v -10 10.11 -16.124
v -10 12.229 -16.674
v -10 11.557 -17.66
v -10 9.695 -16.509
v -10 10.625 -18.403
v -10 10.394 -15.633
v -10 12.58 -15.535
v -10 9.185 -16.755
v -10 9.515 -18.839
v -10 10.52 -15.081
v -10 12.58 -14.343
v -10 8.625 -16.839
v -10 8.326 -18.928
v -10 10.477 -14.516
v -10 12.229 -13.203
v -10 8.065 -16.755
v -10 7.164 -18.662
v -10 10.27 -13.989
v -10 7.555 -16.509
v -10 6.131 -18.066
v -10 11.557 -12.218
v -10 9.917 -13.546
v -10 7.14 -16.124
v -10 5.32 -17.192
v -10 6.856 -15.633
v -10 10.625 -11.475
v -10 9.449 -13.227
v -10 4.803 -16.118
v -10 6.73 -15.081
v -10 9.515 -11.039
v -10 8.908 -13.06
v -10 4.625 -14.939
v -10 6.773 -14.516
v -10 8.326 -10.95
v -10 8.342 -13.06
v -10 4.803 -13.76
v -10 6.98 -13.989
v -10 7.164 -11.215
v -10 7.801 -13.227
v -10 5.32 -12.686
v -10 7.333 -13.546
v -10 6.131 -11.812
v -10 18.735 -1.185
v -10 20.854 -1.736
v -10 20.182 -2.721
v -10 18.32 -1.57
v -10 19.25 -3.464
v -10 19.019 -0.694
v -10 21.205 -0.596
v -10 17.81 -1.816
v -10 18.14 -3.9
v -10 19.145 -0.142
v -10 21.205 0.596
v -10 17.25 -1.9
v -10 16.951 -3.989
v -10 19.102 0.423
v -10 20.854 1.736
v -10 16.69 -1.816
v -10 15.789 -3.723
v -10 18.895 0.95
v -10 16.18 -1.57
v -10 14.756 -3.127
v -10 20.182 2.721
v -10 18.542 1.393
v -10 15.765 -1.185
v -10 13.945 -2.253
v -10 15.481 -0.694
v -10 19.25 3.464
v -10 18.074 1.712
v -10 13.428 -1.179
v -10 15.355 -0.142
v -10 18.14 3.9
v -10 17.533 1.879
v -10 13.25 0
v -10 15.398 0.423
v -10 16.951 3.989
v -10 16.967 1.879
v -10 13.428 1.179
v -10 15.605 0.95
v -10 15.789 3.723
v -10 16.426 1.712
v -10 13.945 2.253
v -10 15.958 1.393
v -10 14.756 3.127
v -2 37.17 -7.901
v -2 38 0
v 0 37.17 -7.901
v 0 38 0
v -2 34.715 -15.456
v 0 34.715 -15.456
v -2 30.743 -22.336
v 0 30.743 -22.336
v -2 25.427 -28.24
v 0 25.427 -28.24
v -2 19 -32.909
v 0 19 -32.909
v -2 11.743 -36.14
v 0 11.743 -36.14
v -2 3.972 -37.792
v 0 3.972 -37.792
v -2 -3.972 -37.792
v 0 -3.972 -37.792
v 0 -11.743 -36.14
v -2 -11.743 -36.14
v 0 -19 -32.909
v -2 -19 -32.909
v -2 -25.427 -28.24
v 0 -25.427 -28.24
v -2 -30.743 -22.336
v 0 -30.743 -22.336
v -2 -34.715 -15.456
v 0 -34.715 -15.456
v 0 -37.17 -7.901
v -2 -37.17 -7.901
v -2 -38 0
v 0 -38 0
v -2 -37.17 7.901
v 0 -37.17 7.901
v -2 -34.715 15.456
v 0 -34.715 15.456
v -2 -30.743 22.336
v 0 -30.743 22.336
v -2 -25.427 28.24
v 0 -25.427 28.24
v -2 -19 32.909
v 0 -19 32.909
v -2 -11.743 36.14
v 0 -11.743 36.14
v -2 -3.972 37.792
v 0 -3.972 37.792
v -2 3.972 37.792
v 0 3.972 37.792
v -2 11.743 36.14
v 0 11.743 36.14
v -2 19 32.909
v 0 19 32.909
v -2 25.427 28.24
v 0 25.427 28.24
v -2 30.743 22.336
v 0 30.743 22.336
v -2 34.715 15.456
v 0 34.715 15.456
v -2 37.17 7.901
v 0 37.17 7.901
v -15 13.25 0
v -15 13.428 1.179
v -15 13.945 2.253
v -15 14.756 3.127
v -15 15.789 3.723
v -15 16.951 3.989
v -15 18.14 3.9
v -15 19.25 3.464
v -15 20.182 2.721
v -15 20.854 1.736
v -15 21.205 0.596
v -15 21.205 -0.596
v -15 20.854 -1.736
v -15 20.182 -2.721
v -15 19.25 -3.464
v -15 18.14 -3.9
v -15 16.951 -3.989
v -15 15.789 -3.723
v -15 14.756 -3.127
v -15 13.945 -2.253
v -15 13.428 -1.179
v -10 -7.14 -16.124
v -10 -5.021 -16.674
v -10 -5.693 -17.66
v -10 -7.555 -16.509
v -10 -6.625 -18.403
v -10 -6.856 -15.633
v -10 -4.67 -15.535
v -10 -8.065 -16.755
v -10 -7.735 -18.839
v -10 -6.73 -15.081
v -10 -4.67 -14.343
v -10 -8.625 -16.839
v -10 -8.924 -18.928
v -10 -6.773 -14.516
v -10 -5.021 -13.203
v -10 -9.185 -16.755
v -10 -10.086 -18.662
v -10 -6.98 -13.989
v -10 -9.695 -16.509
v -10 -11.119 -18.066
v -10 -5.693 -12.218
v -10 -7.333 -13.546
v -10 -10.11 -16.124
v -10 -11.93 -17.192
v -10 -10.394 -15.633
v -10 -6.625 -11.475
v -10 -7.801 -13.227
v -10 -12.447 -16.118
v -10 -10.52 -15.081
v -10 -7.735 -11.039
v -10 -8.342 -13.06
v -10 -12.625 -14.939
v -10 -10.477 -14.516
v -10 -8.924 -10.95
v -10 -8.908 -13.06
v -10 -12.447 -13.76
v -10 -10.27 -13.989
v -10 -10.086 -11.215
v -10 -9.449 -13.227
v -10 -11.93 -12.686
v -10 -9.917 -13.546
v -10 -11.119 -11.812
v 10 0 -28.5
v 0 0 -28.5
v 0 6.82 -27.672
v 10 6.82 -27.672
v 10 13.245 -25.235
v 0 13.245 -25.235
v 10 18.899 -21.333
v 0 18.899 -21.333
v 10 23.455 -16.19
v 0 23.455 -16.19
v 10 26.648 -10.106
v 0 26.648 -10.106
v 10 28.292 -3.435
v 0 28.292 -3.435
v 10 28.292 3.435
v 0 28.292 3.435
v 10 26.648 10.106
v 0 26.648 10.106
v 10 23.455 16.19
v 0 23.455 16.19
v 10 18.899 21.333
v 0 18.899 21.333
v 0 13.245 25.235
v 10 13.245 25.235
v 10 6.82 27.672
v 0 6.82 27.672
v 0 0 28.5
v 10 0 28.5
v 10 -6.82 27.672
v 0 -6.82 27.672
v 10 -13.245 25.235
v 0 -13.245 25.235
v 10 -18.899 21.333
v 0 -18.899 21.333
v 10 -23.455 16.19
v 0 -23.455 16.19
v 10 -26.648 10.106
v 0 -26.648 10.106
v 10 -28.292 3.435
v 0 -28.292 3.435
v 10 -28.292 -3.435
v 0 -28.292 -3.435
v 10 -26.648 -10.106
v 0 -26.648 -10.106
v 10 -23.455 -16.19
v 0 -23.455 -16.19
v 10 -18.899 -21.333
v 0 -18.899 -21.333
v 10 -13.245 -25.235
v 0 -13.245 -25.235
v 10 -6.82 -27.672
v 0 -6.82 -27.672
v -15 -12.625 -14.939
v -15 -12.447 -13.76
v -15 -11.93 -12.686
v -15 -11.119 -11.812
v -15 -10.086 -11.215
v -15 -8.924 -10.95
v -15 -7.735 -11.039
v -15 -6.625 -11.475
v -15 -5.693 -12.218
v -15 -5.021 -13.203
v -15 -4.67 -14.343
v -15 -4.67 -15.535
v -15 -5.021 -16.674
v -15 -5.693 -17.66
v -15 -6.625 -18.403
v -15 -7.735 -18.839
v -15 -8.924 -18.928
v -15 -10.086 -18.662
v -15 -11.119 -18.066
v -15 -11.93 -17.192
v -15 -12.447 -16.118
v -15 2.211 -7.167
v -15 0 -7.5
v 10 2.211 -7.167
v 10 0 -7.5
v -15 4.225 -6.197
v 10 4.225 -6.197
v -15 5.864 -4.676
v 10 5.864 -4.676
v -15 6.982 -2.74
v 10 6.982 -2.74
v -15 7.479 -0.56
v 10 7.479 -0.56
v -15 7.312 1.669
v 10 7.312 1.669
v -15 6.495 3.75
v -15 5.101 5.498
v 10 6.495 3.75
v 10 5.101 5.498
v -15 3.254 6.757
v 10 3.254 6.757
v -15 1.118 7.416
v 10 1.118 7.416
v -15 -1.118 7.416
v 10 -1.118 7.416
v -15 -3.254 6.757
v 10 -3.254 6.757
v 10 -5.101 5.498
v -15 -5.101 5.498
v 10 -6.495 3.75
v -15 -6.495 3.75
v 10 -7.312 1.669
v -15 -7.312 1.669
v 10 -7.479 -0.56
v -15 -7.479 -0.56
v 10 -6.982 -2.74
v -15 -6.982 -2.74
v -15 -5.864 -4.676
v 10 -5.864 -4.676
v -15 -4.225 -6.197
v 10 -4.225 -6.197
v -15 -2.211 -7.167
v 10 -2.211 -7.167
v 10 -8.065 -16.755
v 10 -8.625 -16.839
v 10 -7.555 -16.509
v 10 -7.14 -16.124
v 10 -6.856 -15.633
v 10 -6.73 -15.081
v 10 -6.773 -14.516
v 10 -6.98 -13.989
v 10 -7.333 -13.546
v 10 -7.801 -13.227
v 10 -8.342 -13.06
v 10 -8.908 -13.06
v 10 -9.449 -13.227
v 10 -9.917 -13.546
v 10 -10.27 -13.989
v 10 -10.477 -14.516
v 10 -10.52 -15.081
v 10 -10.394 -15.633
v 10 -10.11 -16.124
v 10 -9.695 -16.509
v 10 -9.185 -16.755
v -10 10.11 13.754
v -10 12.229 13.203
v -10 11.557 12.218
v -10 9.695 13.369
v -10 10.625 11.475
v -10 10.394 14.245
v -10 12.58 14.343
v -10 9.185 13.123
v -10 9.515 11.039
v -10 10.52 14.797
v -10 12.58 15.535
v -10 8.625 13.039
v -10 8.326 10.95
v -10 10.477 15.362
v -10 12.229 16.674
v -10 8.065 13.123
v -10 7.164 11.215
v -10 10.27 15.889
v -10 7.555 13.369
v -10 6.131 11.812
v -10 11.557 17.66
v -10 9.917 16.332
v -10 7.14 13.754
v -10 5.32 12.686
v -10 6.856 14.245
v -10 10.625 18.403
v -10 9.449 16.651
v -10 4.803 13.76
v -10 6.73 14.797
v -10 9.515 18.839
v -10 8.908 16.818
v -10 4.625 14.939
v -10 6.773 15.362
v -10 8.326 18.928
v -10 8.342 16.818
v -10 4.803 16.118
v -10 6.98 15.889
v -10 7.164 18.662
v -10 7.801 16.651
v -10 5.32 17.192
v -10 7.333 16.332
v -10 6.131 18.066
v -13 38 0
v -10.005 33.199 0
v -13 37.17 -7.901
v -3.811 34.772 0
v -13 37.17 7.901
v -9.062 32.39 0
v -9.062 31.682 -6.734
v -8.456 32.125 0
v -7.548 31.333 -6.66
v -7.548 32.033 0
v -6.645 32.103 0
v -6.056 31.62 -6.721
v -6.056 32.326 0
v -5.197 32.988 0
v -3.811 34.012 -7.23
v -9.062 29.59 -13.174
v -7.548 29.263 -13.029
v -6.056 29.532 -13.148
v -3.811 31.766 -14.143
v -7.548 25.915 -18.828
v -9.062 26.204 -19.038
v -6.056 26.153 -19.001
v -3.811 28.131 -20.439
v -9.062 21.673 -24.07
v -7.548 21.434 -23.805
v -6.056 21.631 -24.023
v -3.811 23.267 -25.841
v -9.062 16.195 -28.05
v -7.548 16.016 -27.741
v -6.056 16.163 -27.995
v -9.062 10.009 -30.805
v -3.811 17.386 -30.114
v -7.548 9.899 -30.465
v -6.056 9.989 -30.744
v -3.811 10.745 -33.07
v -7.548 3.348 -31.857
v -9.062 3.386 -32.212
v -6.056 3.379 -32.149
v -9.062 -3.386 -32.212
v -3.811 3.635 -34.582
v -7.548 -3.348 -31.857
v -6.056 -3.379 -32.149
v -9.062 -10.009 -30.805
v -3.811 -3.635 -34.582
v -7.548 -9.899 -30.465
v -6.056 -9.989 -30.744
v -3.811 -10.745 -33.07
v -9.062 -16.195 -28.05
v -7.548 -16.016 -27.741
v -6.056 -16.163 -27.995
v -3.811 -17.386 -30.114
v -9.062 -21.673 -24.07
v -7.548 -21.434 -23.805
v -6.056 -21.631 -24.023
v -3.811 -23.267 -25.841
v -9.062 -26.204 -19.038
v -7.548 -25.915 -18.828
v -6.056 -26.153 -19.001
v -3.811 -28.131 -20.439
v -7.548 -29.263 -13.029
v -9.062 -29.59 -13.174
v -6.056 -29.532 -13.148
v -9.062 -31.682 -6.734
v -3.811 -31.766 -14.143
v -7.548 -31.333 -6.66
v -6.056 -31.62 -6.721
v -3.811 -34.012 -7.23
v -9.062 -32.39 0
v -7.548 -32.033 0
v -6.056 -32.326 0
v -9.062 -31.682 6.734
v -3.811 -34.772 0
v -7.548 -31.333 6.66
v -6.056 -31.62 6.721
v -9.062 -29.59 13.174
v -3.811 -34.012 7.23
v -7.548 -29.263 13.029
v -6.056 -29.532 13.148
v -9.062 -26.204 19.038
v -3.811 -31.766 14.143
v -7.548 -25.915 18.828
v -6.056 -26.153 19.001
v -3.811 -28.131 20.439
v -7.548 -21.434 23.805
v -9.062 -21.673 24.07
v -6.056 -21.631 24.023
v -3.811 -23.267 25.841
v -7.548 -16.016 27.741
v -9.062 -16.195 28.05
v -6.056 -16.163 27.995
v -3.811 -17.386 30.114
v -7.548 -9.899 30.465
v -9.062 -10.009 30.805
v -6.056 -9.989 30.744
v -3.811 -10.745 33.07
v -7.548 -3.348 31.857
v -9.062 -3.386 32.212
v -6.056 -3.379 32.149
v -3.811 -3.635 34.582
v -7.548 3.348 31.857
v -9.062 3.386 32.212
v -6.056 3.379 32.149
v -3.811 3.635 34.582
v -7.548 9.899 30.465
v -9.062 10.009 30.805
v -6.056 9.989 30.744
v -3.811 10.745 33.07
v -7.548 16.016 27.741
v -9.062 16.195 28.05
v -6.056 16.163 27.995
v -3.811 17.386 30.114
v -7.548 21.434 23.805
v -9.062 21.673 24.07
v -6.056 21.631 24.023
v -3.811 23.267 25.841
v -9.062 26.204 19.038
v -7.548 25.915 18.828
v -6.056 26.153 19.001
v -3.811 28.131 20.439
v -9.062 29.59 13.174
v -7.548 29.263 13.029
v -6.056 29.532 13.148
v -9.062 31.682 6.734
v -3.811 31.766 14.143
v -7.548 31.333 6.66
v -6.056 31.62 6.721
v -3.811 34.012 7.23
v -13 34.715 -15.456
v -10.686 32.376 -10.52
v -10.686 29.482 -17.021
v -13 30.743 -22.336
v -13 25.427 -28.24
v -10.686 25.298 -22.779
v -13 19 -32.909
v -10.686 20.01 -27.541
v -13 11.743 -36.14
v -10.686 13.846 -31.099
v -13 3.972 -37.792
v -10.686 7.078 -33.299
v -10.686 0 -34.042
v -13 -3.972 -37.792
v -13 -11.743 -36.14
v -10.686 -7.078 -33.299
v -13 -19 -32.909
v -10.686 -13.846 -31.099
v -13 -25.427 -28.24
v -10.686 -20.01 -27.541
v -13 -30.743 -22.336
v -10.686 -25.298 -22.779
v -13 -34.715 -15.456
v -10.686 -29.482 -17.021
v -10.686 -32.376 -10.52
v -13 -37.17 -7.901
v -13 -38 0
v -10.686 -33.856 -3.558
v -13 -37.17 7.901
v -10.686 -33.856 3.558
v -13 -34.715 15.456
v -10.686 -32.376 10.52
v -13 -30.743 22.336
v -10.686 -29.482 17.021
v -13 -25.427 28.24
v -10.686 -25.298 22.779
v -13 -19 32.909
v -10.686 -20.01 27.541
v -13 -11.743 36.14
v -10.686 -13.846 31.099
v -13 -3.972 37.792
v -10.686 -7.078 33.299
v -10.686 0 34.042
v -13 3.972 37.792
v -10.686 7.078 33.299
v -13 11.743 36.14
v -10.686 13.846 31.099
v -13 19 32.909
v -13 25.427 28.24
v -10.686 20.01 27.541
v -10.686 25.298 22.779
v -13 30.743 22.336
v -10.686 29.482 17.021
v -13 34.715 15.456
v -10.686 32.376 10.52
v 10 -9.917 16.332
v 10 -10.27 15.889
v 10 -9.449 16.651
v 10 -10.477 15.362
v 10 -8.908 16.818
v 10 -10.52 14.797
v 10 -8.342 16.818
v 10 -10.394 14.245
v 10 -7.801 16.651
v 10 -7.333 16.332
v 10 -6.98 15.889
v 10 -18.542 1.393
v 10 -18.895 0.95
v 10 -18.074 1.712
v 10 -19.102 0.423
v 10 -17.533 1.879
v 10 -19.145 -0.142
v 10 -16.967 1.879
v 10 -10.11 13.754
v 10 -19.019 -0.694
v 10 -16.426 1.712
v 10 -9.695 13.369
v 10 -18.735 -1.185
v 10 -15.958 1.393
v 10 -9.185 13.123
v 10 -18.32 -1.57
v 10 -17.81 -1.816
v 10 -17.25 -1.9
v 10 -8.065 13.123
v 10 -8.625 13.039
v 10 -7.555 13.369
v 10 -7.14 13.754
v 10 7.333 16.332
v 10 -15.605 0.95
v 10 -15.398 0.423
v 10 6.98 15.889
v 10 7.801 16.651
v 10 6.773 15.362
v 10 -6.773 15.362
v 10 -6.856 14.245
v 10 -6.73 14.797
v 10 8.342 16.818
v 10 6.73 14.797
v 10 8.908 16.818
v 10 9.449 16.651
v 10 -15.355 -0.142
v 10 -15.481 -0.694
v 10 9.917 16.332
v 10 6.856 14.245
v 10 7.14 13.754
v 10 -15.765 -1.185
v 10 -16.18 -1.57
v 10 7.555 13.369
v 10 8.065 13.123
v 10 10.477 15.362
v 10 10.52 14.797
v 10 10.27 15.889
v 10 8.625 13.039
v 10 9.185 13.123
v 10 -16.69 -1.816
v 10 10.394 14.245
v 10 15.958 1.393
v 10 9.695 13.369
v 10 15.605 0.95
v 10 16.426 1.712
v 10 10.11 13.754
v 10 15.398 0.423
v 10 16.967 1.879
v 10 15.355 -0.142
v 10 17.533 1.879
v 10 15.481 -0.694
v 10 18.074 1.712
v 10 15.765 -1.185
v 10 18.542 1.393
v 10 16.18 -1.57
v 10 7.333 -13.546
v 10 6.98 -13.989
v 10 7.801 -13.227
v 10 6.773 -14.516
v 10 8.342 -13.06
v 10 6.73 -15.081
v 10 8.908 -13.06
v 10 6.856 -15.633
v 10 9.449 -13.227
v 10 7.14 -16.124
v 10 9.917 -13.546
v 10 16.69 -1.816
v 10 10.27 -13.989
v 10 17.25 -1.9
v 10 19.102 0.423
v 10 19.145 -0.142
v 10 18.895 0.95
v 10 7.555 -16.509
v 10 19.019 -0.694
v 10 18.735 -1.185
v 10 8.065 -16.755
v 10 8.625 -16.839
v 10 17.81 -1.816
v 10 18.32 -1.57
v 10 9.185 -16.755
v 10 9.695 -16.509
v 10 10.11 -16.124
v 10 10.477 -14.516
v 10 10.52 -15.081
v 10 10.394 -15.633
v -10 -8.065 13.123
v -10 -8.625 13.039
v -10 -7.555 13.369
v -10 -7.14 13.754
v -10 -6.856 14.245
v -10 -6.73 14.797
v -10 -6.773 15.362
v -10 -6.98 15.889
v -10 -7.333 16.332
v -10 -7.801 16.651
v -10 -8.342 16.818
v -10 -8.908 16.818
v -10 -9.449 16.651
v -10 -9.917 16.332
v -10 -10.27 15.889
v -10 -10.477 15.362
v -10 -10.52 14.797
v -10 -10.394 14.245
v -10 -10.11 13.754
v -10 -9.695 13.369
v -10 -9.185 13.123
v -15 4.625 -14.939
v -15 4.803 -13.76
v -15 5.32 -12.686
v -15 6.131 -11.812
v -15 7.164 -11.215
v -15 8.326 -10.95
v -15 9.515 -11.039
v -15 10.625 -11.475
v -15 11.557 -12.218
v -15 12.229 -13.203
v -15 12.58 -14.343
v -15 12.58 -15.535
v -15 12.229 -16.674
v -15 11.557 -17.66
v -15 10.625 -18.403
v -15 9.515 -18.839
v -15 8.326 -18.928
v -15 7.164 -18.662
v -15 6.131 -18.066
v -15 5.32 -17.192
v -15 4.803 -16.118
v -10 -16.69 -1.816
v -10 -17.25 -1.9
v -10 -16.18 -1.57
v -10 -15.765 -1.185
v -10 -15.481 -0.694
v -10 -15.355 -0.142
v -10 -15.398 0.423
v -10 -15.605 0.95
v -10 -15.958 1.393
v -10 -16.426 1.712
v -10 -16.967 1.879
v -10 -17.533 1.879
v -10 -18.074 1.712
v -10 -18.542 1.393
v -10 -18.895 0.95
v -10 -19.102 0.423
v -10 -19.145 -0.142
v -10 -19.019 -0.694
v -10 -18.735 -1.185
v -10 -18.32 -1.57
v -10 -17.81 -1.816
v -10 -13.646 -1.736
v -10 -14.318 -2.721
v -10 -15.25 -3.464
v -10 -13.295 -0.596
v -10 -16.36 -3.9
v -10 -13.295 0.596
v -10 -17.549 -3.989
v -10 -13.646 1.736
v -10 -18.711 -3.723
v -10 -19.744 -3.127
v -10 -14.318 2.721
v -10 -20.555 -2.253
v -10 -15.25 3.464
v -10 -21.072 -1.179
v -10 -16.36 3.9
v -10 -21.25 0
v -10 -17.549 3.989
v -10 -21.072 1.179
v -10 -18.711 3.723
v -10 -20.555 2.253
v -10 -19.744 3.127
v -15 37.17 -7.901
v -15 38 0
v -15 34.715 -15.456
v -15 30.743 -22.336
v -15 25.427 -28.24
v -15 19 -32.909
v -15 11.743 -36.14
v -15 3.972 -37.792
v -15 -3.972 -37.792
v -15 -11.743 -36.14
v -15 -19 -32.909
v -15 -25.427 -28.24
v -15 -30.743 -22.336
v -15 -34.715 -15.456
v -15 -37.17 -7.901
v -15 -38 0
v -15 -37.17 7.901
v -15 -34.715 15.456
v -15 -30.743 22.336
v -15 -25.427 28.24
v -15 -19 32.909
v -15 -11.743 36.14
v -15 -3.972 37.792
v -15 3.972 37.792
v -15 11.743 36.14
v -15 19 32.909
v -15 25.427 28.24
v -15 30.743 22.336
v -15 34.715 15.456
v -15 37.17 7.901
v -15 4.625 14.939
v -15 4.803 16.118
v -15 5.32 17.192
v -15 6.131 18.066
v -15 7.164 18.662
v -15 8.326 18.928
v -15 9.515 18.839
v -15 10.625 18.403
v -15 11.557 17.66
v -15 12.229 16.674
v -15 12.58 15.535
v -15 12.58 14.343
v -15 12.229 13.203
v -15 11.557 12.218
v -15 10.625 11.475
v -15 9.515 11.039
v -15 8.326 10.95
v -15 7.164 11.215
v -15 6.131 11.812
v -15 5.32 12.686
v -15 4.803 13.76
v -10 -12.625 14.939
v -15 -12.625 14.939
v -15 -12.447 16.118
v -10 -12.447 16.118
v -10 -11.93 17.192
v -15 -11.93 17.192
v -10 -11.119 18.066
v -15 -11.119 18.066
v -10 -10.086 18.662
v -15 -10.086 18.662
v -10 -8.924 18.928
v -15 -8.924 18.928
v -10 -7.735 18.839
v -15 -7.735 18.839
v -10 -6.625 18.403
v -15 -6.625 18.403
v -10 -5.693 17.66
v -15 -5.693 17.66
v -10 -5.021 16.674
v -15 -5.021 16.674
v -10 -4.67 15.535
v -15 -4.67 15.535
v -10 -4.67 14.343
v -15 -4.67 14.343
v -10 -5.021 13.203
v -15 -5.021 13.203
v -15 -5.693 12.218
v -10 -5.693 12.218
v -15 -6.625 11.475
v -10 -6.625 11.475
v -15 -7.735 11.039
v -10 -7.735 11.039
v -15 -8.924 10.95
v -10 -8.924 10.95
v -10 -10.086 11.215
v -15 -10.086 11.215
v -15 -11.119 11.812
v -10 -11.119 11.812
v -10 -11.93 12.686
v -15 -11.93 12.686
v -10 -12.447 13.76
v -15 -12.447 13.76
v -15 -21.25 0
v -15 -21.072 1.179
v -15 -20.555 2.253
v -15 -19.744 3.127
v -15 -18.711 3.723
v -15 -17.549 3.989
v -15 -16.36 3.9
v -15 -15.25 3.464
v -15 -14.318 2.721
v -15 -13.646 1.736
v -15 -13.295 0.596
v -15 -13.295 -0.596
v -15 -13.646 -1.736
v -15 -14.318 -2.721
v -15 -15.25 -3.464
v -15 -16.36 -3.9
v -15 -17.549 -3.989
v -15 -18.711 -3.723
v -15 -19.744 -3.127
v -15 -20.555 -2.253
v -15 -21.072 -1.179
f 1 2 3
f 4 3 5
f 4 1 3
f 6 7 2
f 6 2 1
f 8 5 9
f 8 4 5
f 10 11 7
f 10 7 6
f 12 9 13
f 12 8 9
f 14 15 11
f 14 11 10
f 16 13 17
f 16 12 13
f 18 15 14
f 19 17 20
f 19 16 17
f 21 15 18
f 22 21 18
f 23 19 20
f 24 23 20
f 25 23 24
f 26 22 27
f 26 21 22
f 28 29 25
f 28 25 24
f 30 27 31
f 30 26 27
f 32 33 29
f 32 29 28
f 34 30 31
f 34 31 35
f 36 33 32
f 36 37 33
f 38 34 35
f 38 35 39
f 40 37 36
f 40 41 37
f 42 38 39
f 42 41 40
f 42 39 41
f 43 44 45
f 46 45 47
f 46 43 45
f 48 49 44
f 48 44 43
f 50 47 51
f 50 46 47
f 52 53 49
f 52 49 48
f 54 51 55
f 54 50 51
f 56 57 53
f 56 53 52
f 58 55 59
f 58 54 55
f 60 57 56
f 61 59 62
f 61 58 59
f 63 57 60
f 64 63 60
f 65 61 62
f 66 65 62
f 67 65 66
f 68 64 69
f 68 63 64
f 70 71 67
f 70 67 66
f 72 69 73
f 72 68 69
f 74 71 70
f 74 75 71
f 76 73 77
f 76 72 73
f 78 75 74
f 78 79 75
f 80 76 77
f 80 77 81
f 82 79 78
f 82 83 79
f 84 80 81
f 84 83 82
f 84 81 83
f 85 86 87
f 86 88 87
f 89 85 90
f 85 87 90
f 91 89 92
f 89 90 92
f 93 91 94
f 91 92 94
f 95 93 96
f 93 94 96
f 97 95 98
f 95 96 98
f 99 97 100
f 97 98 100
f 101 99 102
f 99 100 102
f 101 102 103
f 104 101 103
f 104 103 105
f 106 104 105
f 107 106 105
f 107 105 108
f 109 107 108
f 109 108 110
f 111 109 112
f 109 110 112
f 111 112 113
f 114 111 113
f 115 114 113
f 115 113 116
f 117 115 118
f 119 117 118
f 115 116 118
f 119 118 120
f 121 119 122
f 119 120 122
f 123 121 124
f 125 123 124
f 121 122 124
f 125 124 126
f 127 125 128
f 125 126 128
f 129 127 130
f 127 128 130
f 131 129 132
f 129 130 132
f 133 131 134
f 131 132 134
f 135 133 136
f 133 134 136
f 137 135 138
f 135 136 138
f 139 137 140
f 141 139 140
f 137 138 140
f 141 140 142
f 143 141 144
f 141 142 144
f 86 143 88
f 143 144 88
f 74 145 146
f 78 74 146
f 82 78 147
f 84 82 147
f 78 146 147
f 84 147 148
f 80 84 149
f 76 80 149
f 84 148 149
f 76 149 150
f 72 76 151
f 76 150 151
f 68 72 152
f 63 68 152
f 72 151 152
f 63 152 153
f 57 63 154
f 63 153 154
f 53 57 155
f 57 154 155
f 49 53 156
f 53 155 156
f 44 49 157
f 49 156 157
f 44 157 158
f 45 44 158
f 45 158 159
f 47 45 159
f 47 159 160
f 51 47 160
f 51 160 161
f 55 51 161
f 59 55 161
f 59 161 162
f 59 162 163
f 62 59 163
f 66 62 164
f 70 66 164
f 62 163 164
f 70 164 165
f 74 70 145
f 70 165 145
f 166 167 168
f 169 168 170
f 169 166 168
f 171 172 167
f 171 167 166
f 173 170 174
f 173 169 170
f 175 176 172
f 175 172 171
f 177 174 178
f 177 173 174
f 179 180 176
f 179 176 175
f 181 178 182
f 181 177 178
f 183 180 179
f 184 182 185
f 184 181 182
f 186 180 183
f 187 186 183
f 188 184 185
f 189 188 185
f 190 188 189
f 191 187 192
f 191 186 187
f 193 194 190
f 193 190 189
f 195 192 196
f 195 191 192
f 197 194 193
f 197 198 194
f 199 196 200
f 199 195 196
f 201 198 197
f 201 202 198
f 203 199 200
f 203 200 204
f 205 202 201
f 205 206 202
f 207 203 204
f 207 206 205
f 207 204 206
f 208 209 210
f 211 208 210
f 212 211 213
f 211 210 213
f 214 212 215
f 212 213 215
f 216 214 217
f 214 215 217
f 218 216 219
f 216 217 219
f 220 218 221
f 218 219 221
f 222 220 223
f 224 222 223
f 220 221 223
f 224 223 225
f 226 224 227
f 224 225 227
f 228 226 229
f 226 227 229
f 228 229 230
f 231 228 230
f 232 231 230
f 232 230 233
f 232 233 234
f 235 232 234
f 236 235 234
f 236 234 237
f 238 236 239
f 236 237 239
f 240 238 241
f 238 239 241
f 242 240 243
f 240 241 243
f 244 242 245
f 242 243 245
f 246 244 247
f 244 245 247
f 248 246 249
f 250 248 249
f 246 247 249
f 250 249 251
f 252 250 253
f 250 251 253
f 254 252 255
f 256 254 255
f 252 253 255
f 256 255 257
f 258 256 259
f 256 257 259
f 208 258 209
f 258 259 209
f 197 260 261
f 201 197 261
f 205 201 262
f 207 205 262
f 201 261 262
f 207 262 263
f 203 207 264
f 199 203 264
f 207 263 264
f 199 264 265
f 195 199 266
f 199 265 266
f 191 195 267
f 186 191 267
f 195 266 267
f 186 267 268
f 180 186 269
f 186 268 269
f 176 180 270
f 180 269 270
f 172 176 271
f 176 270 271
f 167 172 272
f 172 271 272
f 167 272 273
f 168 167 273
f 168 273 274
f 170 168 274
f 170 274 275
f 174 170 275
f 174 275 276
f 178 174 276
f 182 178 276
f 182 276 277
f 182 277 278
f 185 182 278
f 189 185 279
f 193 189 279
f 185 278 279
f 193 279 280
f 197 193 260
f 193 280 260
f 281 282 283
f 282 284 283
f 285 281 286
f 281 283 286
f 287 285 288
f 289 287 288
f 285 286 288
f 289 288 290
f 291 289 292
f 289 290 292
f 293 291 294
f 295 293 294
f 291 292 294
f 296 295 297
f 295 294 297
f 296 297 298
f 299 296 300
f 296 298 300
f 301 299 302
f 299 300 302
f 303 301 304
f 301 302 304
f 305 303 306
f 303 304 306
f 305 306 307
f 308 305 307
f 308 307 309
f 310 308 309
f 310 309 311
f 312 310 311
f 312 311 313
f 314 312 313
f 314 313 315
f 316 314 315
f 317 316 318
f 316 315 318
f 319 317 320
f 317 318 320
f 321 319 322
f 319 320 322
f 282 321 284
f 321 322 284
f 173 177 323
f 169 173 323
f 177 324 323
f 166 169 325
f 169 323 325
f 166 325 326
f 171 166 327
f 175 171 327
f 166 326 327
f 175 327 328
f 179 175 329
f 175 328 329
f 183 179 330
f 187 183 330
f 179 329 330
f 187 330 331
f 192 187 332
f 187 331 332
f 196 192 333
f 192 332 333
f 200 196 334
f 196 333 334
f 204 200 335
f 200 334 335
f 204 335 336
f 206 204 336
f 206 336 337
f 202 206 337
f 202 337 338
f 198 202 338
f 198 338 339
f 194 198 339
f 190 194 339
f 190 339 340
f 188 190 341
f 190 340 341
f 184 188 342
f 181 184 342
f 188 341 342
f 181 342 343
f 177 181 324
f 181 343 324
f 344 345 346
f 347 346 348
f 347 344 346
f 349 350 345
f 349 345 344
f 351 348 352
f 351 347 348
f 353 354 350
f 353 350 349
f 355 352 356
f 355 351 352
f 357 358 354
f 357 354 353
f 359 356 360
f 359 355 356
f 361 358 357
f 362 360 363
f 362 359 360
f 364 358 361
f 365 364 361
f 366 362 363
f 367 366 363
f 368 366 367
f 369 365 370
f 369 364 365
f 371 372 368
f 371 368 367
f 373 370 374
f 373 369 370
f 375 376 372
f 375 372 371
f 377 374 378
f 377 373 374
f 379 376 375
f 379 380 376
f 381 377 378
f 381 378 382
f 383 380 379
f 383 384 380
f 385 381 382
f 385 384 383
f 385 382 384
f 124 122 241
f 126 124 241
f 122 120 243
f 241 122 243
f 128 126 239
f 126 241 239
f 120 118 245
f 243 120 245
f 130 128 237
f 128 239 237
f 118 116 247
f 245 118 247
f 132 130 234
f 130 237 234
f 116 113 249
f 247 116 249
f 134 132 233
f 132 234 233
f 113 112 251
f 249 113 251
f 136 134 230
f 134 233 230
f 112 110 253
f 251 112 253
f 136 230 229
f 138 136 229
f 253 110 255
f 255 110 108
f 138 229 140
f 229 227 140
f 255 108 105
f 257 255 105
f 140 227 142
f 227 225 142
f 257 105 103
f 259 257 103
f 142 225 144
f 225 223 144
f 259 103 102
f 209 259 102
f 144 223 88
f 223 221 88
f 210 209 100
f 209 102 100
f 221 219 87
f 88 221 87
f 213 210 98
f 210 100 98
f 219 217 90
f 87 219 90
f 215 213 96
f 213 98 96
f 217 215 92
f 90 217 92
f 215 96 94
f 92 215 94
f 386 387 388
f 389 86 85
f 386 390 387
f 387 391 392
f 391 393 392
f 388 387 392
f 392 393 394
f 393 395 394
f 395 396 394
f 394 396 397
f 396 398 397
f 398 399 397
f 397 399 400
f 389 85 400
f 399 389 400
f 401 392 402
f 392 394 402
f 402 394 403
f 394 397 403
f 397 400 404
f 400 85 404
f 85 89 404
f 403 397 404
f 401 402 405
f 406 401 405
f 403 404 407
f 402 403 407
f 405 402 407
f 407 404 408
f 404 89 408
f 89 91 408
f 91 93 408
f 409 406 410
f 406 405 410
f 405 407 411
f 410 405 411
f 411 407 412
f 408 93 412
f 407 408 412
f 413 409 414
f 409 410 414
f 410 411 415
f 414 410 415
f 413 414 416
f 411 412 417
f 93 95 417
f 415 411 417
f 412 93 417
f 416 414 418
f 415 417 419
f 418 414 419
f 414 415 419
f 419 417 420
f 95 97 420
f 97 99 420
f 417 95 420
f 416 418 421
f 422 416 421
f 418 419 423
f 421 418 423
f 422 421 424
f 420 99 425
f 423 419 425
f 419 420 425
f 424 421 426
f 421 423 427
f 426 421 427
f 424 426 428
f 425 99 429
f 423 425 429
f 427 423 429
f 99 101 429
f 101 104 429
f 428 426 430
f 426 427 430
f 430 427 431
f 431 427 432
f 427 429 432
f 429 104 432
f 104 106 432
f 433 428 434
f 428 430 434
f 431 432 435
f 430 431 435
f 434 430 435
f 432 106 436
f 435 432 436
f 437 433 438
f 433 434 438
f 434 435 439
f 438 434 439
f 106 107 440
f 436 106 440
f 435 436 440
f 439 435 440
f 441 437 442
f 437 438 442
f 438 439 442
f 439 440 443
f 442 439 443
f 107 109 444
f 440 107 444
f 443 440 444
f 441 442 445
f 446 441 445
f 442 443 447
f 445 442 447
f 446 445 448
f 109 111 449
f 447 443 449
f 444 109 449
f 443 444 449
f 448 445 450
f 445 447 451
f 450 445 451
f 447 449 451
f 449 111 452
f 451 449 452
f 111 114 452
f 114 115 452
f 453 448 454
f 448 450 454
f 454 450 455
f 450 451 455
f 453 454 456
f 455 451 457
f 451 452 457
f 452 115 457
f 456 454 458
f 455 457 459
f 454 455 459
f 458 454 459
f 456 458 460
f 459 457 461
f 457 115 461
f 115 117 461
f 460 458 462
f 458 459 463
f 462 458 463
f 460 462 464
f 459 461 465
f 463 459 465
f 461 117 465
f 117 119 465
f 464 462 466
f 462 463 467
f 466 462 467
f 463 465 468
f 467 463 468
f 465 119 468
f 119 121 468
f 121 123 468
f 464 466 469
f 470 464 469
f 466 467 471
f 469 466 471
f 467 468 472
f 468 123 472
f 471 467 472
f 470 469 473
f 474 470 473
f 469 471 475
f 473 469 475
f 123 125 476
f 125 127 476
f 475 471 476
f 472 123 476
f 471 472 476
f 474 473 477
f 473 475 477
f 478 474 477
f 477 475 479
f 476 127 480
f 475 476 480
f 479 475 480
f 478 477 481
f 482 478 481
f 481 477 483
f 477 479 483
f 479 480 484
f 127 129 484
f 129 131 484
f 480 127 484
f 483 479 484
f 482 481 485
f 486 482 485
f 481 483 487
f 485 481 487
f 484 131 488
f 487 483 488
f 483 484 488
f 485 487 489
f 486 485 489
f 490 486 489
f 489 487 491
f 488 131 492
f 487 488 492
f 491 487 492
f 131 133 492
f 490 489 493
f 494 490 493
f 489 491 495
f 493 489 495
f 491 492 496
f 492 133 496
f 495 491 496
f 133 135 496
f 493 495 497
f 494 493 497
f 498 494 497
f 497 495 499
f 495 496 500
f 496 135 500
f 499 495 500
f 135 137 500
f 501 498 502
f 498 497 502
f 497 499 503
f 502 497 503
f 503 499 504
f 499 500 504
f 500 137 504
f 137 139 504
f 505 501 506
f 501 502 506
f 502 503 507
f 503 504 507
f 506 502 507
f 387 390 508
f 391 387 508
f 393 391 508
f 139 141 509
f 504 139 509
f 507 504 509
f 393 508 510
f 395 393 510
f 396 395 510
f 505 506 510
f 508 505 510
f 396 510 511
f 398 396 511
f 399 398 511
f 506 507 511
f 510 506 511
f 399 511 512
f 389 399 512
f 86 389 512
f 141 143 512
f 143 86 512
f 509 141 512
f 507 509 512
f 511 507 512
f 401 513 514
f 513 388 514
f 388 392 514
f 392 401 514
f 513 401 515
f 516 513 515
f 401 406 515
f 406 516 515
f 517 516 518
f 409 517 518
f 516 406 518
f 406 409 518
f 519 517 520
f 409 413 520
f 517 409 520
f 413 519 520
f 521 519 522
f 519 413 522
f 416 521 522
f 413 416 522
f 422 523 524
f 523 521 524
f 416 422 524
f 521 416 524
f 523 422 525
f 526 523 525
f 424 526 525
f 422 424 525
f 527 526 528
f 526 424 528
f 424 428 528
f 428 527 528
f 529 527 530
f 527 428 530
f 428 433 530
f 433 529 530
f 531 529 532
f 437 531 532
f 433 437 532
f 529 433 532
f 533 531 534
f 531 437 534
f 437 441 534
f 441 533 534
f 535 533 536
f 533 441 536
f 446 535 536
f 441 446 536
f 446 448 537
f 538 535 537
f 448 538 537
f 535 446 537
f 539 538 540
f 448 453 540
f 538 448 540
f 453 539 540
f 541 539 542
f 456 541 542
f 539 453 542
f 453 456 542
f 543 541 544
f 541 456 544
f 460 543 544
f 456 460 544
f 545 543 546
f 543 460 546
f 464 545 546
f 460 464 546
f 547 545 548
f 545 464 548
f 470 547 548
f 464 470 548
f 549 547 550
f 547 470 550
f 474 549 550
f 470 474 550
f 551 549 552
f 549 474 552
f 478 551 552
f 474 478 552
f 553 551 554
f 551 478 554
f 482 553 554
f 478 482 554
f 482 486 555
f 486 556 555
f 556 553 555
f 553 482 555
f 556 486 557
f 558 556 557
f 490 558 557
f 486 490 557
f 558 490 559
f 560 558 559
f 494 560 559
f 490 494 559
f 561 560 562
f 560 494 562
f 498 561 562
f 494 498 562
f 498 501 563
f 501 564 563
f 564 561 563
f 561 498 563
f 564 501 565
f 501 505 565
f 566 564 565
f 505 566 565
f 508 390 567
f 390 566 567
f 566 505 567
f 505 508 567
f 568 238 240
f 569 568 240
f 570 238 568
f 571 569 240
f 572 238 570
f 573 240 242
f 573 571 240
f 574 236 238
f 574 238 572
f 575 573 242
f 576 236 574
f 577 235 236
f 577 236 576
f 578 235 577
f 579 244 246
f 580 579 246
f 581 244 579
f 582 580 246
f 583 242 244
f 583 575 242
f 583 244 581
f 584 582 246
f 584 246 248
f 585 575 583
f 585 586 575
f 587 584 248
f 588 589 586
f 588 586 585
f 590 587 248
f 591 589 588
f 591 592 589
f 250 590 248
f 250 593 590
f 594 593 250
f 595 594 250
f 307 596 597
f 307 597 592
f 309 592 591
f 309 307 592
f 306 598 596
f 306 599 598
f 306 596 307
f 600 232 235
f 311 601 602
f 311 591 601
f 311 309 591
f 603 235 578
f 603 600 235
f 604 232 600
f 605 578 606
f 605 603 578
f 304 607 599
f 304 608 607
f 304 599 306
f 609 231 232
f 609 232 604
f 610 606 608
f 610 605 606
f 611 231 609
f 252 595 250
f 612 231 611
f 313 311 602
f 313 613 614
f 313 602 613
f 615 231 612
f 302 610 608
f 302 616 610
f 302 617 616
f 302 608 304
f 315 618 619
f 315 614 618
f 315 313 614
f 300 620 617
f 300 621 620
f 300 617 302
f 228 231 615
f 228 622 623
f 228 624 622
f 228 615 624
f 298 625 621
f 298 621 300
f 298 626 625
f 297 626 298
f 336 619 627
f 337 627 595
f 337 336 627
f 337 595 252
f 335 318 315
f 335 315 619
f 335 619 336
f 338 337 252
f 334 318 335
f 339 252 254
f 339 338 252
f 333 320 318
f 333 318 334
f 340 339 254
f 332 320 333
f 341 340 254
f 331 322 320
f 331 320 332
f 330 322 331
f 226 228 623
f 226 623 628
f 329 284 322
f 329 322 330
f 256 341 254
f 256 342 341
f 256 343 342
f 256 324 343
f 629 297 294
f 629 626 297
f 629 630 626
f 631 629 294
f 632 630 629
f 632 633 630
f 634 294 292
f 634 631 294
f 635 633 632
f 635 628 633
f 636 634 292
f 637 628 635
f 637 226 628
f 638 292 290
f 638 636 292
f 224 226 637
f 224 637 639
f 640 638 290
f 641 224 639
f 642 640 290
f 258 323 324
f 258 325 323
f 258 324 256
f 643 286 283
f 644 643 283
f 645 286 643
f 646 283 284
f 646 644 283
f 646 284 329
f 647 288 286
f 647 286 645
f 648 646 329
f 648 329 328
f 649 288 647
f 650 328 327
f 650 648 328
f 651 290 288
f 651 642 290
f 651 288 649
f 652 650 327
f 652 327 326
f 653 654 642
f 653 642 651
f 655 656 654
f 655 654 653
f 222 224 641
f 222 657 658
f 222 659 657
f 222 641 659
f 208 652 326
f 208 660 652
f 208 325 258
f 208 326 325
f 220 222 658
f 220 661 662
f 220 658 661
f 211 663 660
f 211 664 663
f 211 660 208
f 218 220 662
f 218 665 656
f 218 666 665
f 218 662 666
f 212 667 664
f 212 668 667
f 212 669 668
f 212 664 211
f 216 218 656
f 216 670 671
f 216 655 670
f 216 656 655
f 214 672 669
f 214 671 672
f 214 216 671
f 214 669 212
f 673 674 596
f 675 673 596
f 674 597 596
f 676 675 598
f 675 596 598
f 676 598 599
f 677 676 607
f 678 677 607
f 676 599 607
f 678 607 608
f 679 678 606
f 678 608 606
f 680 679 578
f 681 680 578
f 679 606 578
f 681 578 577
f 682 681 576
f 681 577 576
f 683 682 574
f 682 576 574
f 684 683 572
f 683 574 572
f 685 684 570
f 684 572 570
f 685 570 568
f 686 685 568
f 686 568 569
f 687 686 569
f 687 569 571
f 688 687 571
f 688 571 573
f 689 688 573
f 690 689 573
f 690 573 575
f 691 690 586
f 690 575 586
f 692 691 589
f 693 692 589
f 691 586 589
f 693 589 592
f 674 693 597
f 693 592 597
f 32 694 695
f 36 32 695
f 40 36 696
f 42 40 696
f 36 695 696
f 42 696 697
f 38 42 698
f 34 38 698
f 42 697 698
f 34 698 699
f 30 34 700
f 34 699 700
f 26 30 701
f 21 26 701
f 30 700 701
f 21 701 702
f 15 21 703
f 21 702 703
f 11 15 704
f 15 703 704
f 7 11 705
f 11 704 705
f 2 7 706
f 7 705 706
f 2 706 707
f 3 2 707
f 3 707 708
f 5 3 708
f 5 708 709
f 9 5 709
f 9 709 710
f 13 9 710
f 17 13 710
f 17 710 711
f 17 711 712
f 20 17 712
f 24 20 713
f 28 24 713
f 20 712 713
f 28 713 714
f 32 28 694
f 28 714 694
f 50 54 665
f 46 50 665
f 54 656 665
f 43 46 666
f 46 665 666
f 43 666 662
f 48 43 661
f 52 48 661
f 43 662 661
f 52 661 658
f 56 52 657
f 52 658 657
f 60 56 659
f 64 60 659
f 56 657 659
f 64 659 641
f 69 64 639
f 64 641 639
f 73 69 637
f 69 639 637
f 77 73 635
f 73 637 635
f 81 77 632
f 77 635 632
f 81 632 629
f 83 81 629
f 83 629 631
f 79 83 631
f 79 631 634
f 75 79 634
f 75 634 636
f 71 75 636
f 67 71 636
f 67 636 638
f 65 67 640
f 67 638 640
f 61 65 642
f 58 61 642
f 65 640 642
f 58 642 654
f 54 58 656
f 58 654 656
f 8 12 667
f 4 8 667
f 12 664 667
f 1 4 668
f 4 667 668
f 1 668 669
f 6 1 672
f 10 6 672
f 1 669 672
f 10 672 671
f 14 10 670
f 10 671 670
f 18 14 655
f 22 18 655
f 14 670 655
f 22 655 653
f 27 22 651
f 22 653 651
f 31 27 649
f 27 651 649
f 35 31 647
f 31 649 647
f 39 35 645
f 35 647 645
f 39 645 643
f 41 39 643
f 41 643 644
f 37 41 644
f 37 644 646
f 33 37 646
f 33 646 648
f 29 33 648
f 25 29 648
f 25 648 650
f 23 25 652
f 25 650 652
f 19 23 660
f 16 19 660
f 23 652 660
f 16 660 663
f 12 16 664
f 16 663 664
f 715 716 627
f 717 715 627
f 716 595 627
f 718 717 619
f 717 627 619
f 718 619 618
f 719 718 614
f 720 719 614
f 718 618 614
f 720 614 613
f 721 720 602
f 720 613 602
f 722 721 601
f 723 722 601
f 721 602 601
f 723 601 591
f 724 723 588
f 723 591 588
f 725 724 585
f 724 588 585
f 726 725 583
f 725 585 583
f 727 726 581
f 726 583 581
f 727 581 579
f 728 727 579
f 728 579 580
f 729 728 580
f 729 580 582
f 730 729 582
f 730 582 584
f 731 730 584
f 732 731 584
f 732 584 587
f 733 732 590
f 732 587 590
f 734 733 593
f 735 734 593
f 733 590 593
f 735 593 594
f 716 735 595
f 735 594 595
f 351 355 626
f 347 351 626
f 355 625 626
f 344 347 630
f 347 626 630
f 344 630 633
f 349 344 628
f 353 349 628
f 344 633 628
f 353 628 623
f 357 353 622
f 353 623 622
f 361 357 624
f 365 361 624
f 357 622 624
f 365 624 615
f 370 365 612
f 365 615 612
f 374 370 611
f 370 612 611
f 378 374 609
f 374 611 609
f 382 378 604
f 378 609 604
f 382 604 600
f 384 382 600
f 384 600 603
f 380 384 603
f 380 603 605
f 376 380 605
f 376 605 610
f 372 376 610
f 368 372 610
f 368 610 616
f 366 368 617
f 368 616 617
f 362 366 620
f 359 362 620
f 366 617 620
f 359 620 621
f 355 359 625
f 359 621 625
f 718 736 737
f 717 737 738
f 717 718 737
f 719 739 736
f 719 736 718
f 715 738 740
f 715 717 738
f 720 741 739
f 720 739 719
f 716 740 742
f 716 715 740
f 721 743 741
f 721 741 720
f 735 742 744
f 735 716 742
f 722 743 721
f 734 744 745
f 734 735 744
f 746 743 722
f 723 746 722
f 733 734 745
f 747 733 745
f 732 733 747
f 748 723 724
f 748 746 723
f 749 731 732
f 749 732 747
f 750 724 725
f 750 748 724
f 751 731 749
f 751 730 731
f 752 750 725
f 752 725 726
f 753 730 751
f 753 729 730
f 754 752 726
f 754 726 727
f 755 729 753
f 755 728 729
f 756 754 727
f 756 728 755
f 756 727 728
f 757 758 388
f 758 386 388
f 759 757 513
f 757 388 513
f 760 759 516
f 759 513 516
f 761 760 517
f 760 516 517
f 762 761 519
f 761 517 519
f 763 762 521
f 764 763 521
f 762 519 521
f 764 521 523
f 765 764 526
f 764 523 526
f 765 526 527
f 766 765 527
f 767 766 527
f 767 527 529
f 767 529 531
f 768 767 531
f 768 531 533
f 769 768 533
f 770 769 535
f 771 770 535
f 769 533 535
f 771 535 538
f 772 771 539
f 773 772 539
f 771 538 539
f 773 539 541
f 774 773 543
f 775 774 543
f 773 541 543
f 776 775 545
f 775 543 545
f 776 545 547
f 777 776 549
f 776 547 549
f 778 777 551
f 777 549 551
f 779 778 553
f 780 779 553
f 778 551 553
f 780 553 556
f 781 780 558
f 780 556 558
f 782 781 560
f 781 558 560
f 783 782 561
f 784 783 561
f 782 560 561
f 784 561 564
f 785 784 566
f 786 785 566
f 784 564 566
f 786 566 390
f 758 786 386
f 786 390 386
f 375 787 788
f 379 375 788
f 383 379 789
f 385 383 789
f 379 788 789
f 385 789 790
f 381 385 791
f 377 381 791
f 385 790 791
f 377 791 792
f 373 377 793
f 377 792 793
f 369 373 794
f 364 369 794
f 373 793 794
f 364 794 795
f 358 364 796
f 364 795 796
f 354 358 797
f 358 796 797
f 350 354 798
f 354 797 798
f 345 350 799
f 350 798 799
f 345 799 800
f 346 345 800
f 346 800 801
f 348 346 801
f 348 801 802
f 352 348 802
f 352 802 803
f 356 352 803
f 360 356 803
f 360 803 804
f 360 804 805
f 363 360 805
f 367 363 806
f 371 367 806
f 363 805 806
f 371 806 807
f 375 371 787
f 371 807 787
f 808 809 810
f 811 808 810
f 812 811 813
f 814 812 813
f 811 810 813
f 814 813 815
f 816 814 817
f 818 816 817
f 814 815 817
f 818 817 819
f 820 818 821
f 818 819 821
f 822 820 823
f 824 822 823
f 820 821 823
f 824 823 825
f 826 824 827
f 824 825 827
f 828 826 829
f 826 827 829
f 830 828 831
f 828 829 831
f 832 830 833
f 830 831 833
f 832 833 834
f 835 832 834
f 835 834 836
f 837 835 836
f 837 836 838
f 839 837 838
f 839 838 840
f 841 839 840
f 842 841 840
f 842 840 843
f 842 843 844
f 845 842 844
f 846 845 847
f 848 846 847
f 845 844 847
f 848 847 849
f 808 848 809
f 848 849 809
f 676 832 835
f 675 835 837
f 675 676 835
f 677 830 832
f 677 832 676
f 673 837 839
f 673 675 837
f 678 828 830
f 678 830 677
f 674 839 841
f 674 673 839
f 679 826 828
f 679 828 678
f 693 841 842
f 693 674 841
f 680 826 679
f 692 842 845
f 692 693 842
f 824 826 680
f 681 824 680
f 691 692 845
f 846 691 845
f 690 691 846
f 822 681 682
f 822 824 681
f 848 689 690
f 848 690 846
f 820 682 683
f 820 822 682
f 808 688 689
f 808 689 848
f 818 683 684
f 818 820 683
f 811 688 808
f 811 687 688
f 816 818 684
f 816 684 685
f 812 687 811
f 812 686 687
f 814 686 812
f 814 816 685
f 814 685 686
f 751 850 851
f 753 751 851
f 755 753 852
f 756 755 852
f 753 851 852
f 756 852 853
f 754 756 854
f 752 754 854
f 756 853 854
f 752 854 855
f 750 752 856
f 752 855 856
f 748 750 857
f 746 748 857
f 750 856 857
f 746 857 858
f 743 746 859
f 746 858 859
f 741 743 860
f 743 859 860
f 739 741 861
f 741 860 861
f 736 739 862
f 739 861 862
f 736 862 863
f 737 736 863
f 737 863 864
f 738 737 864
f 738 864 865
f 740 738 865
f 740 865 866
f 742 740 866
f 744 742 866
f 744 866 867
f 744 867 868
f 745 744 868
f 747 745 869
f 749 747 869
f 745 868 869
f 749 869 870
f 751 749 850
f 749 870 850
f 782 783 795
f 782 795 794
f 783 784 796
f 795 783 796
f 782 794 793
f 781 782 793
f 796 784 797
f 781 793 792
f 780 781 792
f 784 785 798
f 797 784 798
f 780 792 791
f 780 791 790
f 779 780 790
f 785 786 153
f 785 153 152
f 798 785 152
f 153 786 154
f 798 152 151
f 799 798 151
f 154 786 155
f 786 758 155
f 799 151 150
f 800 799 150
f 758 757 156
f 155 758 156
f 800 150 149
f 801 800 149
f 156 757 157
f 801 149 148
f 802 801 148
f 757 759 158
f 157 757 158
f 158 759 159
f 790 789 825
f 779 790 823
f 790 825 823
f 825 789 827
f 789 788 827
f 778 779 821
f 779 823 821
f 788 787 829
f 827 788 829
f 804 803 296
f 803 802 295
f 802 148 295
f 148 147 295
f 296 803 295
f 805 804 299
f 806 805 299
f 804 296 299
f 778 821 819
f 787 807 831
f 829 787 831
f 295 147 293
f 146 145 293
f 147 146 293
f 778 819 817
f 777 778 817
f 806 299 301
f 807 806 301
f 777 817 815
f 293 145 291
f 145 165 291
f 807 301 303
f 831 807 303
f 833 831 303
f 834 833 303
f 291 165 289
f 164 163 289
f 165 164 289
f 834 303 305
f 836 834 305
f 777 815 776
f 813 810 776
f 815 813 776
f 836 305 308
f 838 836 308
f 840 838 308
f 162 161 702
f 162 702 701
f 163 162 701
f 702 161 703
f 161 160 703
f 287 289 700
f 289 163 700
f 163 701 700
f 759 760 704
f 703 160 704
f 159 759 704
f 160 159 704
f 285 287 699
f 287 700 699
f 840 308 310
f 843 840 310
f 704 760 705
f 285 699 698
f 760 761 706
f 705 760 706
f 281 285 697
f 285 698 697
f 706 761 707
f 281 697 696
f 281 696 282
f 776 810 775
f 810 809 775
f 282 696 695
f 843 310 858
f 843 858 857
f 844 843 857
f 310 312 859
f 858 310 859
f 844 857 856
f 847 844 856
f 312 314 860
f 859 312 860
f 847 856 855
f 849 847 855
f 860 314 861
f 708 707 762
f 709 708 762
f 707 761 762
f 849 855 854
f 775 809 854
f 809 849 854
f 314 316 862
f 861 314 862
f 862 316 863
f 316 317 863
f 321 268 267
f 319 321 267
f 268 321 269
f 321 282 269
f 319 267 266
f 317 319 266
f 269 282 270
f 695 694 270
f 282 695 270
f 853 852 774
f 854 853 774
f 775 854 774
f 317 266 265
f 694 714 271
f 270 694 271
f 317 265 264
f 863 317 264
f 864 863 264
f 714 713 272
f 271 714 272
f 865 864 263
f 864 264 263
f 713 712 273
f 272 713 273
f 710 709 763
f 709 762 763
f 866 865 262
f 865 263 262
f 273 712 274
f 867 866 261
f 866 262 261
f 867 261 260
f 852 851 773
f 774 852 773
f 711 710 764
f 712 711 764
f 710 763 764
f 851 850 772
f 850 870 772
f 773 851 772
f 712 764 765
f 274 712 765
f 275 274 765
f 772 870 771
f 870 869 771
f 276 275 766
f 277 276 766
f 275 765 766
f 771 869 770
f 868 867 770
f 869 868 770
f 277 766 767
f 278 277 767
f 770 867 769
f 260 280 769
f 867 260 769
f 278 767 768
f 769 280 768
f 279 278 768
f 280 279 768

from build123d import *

# Parameters (mm, degrees)
SKETCH_1_R         = 28.5
SKETCH_1_R_2       = 1.9
SKETCH_1_R_3       = 7.5
EXTRUDE_1_DEPTH    = 10
SKETCH3_R          = 1.9
SKETCH3_R_2        = 7.5
CUT_EXTRUDE1_DEPTH = 60.270566179
SKETCH4_R          = 4
CUT_EXTRUDE2_DEPTH = 5


with BuildPart() as part:
    # 草图1 → 凸台-拉伸1 (new body)
    with BuildSketch(Plane(origin=(0, 0, 0), x_dir=(0, 0, -1), z_dir=(1, 0, 0))):
        Circle(SKETCH_1_R)
        with Locations((0, 17.25)):
            Circle(SKETCH_1_R_2, mode=Mode.SUBTRACT)
        with Locations((14.938938215, 8.625)):
            Circle(SKETCH_1_R_2, mode=Mode.SUBTRACT)
        with Locations((14.938938215, -8.625)):
            Circle(SKETCH_1_R_2, mode=Mode.SUBTRACT)
        with Locations((0, -17.25)):
            Circle(SKETCH_1_R_2, mode=Mode.SUBTRACT)
        with Locations((-14.938938215, -8.625)):
            Circle(SKETCH_1_R_2, mode=Mode.SUBTRACT)
        with Locations((-14.938938215, 8.625)):
            Circle(SKETCH_1_R_2, mode=Mode.SUBTRACT)
        Circle(SKETCH_1_R_3, mode=Mode.SUBTRACT)
    extrude(amount=EXTRUDE_1_DEPTH)

    # Sketch2 → Revolve1 (revolve)
    with BuildSketch(Plane.XY):
        with BuildLine():
            Line((0, 0), (-15, 0))
            Line((-15, 0), (-15, 38))
            Line((-15, 38), (-13, 38))
            add(Edge.make_bspline(
                [(-13, 38), (-9.977066976, 32.039576737), (-7.515495422, 32.019303811), (-5.003056497, 32.052880233), (-2, 38)],
                knots=[0.048051887, 0.048051887, 0.048051887, 0.048051887, 0.500504931, 0.951948113, 0.951948113, 0.951948113, 0.951948113], degree=3))
            Line((-2, 38), (0, 38))
            Line((0, 38), (0, 0))
        make_face()
    revolve(axis=Axis((0, 0, 0), (-1, 0, 0)))

    # Sketch3 → Cut-Extrude1 (cut, through all)
    with BuildSketch(Plane(origin=(10, 0, 0), x_dir=(0, 0, -1), z_dir=(1, 0, 0))):
        with Locations((14.938938215, 8.625)):
            Circle(SKETCH3_R)
        with Locations((14.938938215, -8.625)):
            Circle(SKETCH3_R)
        with Locations((0, -17.25)):
            Circle(SKETCH3_R)
        with Locations((-14.938938215, -8.625)):
            Circle(SKETCH3_R)
        with Locations((0, 17.25)):
            Circle(SKETCH3_R)
        with Locations((-14.938938215, 8.625)):
            Circle(SKETCH3_R)
        Circle(SKETCH3_R_2)
    extrude(amount=-CUT_EXTRUDE1_DEPTH, mode=Mode.SUBTRACT)

    # Sketch4 → Cut-Extrude2 (cut)
    with BuildSketch(Plane.ZY.offset(15)):
        with Locations(Location((14.938938215, 8.625, 0), (0, 0, 270))):
            Circle(SKETCH4_R)
        with Locations(Location((14.938938215, -8.625, 0), (0, 0, 270))):
            Circle(SKETCH4_R)
        with Locations(Location((0, -17.25, 0), (0, 0, 270))):
            Circle(SKETCH4_R)
        with Locations(Location((-14.938938215, -8.625, 0), (0, 0, 270))):
            Circle(SKETCH4_R)
        with Locations(Location((-14.938938215, 8.625, 0), (0, 0, 270))):
            Circle(SKETCH4_R)
        with Locations(Location((0, 17.25, 0), (0, 0, 270))):
            Circle(SKETCH4_R)
    extrude(amount=-CUT_EXTRUDE2_DEPTH, mode=Mode.SUBTRACT)


solid = part.part
